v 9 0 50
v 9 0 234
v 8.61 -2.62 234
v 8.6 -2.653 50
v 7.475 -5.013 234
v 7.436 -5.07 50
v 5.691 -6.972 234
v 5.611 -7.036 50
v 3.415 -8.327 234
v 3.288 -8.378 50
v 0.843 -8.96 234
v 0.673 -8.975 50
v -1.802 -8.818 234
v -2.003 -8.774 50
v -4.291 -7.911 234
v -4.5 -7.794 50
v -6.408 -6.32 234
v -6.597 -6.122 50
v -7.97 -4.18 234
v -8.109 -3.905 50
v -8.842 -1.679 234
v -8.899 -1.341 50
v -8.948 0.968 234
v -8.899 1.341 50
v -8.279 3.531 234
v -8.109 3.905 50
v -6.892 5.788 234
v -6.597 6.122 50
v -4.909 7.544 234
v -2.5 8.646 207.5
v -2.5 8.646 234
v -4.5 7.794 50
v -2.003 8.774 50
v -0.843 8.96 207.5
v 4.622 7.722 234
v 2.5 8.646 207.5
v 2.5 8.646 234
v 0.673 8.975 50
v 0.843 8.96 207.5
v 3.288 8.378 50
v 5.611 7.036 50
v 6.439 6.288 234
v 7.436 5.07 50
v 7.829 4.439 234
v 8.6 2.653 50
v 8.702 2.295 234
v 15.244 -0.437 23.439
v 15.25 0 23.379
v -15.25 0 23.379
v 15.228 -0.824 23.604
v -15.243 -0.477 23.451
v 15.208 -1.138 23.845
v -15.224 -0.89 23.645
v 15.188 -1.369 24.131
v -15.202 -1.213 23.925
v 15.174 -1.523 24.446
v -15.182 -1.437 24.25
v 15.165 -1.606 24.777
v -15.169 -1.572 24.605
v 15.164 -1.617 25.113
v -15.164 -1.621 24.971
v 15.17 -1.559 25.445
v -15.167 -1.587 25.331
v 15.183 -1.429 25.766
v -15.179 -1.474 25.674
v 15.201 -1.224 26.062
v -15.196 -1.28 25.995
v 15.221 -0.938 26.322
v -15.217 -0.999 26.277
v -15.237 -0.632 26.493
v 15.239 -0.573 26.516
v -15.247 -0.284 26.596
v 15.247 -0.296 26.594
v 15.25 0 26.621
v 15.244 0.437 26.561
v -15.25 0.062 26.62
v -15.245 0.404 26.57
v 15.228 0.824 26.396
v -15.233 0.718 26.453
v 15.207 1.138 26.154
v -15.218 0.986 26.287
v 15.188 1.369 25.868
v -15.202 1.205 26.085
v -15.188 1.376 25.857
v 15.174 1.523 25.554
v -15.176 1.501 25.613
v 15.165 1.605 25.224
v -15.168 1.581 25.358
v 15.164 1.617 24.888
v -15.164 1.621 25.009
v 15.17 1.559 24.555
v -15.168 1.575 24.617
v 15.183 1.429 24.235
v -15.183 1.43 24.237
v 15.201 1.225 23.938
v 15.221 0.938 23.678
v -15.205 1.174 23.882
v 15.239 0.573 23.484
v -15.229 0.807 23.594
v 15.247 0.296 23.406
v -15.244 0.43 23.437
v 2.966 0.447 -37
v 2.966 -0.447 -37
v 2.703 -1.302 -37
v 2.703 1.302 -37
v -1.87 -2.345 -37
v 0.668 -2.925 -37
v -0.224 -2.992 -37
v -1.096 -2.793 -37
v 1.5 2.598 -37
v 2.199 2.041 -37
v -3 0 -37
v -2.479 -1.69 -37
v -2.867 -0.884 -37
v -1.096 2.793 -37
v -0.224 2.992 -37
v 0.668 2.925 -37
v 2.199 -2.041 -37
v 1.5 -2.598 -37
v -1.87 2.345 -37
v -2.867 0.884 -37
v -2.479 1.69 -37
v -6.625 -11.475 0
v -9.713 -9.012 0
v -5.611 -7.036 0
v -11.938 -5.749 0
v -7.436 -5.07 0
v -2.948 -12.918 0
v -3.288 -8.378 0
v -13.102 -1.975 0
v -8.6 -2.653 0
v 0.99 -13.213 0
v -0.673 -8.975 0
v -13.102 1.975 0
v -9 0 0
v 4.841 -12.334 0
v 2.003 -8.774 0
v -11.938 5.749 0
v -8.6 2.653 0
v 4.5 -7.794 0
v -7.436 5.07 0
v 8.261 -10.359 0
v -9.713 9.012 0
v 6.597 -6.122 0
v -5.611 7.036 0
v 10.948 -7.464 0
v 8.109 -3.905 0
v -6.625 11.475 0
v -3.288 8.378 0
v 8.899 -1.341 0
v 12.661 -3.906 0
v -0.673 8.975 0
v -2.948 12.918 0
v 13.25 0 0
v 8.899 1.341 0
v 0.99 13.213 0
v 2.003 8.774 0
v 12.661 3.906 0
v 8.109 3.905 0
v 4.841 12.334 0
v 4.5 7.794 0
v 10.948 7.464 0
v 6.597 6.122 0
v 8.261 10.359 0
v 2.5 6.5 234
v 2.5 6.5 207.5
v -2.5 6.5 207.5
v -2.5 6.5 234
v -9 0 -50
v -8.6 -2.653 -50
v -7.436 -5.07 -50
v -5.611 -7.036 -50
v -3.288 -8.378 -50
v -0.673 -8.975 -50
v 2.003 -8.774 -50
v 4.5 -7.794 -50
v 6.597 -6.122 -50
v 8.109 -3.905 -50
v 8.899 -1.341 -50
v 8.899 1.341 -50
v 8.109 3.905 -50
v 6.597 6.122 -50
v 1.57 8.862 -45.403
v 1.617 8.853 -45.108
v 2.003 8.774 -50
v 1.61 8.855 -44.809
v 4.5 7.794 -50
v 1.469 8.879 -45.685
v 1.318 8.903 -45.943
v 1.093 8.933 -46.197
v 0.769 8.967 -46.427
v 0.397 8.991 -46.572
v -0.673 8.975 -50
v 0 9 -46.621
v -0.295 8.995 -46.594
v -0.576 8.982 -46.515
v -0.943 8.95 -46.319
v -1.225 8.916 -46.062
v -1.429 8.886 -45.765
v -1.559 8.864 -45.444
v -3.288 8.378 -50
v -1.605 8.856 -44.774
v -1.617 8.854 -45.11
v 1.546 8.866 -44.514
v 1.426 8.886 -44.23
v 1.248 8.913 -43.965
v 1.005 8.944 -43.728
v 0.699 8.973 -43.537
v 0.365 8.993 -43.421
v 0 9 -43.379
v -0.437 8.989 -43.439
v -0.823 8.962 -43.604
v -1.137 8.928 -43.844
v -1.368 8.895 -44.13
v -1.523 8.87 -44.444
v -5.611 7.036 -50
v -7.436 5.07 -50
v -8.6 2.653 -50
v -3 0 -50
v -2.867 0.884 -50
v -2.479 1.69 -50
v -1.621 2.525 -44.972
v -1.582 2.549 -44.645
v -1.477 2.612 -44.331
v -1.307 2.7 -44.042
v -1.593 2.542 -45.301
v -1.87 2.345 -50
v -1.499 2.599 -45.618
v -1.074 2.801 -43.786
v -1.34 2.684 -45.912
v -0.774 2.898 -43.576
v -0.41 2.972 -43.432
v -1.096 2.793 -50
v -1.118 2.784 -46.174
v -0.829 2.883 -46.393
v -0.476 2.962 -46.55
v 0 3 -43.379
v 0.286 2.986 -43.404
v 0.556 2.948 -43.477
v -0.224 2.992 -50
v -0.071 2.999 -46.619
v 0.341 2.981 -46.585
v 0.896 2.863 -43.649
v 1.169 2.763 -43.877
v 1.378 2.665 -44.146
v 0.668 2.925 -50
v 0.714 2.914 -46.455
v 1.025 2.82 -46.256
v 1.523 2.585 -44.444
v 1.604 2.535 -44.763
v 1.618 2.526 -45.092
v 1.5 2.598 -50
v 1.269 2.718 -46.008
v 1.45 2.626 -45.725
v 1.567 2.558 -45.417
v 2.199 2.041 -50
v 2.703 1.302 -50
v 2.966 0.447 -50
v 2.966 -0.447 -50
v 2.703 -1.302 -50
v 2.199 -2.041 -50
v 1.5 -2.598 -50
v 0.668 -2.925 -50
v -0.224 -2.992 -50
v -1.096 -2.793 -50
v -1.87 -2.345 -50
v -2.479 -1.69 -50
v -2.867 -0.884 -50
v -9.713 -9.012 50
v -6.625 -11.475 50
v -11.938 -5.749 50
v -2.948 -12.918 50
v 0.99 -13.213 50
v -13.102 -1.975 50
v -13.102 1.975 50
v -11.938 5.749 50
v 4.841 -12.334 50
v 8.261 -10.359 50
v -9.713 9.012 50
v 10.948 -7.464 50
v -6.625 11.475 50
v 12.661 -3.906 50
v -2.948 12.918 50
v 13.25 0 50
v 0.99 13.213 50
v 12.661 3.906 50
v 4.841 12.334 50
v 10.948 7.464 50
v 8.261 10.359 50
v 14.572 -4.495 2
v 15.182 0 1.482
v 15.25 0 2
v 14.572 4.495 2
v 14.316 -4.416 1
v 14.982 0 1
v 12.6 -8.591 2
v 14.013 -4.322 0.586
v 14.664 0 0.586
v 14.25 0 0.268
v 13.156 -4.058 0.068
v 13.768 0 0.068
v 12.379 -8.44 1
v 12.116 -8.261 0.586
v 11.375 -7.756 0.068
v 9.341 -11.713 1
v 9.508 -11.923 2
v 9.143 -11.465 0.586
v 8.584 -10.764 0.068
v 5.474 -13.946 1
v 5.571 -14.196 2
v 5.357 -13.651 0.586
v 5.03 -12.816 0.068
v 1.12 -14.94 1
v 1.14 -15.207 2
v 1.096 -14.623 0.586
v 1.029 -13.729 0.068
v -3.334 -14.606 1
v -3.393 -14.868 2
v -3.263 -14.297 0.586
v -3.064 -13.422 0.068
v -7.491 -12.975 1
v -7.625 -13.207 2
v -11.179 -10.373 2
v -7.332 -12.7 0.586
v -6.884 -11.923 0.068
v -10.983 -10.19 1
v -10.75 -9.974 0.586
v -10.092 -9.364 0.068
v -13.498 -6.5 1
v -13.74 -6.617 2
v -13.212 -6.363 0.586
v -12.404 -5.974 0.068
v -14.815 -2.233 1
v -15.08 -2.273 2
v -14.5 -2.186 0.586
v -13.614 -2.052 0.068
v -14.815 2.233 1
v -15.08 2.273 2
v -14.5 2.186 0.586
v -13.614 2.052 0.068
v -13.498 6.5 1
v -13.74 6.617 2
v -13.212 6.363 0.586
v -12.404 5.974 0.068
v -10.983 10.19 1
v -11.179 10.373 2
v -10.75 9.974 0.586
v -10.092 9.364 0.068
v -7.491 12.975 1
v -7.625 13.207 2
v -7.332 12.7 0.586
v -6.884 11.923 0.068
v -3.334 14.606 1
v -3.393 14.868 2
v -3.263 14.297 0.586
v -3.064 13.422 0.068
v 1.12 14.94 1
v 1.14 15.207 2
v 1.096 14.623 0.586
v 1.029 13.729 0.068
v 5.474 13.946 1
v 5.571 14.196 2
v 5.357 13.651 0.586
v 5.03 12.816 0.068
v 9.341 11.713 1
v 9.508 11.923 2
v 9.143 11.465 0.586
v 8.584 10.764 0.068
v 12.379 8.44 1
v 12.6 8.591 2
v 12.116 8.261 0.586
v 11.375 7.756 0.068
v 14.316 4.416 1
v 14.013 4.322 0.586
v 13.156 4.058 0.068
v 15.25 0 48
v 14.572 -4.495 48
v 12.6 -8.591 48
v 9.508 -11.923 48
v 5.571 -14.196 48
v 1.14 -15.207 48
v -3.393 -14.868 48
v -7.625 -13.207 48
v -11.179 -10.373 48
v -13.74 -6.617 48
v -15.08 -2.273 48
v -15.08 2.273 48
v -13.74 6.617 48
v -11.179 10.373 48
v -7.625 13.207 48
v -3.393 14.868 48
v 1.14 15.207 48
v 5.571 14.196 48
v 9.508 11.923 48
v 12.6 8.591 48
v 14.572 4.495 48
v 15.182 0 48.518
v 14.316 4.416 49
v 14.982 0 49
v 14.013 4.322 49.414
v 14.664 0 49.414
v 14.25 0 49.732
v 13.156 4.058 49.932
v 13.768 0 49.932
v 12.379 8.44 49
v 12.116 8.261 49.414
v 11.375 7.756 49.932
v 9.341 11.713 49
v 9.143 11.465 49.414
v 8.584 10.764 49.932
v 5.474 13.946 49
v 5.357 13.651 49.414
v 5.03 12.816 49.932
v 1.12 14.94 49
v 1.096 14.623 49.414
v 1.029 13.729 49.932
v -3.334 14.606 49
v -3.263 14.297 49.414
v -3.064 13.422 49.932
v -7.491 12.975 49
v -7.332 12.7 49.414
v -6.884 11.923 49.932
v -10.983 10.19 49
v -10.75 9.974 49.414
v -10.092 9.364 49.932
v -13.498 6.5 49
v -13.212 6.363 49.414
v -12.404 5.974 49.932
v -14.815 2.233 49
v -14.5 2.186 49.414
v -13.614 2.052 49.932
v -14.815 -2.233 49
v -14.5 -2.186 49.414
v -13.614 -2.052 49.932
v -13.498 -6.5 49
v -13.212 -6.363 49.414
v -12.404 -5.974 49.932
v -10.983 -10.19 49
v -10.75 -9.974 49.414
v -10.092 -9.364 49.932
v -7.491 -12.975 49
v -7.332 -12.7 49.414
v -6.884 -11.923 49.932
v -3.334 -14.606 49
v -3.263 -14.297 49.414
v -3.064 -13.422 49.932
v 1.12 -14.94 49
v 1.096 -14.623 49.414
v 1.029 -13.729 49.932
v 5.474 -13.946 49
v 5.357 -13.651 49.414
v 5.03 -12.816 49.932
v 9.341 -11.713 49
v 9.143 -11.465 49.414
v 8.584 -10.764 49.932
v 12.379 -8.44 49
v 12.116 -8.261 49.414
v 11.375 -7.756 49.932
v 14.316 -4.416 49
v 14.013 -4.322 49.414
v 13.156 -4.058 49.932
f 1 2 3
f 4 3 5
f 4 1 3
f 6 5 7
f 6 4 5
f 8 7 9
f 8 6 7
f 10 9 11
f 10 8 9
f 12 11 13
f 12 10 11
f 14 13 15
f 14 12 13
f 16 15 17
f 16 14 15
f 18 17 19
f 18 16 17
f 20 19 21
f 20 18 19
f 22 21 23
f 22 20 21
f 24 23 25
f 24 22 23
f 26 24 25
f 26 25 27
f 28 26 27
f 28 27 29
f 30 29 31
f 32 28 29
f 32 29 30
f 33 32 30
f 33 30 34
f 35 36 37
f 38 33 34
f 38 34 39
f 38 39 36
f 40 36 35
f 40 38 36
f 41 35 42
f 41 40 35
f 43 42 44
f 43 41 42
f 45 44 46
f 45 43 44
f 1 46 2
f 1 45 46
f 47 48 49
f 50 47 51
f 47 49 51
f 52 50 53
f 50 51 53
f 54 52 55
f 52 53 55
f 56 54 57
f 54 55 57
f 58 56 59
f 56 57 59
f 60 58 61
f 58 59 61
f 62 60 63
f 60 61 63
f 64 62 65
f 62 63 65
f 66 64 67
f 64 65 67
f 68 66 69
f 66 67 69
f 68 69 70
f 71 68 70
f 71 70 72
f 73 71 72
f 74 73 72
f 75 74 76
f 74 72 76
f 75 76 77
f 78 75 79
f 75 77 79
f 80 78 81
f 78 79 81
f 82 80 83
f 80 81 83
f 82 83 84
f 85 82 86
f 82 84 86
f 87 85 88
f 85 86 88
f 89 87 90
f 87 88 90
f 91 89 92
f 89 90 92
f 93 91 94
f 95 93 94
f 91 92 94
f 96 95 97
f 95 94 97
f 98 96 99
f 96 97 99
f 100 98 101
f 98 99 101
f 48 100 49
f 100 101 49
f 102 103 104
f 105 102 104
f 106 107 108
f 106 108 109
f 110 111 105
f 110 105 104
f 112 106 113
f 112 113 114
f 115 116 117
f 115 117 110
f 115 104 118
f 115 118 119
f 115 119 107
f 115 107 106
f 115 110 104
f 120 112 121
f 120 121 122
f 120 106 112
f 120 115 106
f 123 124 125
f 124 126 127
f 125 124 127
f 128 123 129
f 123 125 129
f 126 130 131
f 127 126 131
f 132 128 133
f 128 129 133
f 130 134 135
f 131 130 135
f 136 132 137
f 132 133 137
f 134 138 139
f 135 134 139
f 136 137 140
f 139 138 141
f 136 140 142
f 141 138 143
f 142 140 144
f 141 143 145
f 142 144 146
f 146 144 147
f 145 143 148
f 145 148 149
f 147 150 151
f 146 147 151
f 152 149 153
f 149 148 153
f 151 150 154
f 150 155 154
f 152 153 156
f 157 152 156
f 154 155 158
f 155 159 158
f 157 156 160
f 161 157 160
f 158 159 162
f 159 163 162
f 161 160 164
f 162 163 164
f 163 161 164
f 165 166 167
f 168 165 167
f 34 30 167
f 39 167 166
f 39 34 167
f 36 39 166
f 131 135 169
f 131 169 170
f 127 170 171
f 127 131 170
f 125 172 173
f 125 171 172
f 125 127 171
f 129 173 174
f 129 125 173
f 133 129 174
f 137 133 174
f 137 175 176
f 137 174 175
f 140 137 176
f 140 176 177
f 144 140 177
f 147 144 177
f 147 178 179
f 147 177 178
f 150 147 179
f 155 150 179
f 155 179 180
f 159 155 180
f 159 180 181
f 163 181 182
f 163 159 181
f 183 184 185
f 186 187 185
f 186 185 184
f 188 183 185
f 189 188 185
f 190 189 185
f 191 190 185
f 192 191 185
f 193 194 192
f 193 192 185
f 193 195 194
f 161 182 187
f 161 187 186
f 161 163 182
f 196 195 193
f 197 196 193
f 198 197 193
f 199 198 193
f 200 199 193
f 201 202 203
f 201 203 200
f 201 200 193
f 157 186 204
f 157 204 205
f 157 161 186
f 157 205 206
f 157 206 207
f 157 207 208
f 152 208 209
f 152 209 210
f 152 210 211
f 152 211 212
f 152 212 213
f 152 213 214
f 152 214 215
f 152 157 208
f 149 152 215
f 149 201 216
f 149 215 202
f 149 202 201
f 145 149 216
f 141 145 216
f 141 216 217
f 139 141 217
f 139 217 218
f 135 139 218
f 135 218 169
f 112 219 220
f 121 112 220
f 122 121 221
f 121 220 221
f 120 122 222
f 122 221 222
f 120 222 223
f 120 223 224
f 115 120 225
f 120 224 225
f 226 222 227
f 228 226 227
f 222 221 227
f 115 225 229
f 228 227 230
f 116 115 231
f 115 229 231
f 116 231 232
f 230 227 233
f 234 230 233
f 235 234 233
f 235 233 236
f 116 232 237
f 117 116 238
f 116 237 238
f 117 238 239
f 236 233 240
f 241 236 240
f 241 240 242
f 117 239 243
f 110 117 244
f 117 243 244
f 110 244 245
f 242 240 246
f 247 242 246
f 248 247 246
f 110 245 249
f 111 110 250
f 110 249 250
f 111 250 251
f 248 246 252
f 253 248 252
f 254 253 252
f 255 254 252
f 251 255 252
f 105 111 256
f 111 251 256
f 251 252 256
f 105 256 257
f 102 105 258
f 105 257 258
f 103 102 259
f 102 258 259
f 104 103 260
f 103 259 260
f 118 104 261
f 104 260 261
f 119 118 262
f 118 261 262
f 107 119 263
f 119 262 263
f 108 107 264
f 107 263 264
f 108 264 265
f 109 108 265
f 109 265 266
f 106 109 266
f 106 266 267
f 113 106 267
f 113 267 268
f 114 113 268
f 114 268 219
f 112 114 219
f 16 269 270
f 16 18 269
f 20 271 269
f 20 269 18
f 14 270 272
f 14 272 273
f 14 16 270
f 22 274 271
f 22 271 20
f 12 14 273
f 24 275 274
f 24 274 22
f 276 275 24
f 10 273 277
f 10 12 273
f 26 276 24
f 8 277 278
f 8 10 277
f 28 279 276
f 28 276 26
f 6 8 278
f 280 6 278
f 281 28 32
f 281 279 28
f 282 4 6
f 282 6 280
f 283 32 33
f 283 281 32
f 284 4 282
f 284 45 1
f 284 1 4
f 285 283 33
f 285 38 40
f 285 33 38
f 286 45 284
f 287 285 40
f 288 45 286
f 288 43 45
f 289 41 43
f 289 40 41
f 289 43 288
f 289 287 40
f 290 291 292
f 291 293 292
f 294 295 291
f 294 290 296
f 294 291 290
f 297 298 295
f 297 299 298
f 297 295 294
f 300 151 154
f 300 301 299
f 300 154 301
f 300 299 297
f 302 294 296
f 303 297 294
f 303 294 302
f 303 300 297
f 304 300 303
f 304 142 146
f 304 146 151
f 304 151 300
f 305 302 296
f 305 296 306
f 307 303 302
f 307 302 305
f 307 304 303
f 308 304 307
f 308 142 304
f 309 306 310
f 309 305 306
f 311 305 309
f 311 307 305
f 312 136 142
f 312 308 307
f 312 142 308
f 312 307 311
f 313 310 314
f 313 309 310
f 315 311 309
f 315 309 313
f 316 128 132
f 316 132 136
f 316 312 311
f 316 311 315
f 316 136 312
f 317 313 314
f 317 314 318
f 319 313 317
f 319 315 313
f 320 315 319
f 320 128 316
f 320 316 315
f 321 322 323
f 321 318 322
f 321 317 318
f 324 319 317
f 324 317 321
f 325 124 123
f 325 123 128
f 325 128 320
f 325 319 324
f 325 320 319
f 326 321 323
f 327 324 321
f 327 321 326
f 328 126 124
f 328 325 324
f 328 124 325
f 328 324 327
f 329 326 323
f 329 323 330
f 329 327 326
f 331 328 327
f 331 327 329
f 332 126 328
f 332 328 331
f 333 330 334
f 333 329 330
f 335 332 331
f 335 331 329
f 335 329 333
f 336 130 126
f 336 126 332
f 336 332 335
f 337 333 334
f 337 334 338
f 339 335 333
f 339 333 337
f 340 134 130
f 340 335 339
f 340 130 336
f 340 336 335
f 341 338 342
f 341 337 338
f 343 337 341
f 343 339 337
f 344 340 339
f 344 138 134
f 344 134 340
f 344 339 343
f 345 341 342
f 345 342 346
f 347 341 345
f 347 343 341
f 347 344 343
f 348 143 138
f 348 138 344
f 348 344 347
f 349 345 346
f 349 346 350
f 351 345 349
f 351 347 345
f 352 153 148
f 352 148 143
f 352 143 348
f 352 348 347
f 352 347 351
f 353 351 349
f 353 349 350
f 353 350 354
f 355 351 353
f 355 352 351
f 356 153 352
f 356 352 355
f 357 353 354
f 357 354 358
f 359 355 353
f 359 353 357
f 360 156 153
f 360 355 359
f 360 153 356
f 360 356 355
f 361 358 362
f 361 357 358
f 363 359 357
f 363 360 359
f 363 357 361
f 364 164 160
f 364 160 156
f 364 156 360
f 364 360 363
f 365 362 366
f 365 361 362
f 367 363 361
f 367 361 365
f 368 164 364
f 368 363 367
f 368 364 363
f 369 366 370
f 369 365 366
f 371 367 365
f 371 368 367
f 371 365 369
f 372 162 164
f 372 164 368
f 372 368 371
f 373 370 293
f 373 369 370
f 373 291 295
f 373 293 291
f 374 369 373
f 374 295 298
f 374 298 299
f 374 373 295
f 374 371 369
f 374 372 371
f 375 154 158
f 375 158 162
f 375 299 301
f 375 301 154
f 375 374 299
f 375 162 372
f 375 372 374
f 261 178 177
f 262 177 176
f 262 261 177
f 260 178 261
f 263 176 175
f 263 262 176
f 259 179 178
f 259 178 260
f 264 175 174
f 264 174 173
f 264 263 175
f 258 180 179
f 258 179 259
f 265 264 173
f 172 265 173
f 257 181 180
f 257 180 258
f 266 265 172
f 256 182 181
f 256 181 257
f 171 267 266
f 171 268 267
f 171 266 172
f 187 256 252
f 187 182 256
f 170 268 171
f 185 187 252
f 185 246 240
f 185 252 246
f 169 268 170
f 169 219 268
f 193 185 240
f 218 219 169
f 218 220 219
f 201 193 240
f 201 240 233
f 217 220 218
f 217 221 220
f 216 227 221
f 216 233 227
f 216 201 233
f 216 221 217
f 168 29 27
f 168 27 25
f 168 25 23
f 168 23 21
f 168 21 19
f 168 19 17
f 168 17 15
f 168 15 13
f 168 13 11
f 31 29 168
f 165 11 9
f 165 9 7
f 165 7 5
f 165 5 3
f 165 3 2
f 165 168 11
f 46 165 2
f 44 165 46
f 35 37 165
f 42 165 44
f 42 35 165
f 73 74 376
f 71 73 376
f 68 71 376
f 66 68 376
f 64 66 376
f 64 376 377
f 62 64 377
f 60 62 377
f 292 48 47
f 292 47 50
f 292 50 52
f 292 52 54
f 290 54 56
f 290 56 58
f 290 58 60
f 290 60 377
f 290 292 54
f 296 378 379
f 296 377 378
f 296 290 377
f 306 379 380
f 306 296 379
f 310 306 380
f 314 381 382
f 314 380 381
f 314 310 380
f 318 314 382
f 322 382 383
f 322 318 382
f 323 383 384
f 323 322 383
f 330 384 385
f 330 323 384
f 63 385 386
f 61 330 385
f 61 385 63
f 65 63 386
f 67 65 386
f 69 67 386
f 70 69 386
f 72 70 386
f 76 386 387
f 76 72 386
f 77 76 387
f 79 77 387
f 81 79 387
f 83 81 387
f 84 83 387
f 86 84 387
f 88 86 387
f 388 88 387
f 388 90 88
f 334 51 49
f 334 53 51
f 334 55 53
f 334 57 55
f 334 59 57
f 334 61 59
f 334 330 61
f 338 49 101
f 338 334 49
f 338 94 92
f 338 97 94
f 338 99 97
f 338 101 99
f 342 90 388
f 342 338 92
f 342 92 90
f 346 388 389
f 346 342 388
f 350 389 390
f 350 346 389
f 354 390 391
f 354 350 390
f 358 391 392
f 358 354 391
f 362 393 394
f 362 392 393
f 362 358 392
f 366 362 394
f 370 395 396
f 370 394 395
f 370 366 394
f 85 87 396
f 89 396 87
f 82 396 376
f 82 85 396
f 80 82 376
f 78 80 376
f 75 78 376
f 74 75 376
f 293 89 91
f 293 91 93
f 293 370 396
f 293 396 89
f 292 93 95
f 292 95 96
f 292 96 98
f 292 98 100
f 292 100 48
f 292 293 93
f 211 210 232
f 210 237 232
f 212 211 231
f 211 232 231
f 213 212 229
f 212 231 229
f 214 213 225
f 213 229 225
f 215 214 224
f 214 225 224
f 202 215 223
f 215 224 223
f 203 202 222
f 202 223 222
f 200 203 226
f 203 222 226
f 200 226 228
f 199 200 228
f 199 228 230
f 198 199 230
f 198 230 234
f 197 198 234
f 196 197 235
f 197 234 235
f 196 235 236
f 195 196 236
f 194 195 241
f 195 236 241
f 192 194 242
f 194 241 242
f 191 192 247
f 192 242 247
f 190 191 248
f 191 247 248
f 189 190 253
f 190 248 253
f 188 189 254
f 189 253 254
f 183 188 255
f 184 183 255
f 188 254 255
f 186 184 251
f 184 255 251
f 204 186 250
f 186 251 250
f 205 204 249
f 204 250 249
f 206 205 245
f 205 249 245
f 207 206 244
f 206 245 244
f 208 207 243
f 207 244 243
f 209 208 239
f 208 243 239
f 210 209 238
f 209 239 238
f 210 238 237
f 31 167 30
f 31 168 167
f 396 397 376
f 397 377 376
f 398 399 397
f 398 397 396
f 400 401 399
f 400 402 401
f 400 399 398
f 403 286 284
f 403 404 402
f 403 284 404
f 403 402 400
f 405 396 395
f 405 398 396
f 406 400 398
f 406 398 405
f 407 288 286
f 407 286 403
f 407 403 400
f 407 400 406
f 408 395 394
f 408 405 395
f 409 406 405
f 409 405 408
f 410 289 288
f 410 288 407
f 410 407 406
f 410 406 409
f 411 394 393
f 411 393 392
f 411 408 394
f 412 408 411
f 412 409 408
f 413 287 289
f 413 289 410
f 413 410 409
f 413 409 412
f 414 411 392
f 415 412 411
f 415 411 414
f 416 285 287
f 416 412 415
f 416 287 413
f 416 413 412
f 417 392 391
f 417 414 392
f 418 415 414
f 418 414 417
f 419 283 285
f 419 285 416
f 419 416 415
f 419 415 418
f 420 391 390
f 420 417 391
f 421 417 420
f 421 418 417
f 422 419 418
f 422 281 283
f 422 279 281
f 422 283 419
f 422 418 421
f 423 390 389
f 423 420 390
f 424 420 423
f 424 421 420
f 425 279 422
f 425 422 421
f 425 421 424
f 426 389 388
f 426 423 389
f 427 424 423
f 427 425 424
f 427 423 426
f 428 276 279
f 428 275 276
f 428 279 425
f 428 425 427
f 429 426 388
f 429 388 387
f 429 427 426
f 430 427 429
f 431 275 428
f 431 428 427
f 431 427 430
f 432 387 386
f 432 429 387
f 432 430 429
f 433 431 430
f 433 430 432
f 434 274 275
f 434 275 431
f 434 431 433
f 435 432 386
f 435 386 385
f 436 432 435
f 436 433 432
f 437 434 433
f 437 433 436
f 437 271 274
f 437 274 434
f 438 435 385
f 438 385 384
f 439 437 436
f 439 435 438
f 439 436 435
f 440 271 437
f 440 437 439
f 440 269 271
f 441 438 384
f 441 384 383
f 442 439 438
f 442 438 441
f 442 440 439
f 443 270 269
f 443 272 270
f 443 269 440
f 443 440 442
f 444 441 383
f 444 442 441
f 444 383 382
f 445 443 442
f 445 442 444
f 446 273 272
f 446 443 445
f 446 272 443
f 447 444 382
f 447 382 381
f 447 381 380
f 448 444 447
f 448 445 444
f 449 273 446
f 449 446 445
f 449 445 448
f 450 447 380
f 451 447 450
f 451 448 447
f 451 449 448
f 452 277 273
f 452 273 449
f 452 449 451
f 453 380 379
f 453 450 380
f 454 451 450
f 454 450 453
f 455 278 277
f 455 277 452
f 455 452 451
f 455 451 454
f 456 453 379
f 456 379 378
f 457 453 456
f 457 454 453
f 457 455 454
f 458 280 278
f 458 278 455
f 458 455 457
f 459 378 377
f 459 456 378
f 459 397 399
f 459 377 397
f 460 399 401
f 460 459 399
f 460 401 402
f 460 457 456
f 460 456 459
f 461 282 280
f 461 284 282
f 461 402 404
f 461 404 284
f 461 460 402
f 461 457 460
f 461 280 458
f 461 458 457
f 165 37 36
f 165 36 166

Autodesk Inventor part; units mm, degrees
ref_plane "YZ Plane" through (0, 0, 0) normal (1, 0, 0) x (0, 1, 0)
sketch "Sketch1" plane through (0, 0, 0) normal (0, 0, 1) x (1, 0, 0)
  circle A0 centre (0, 0) radius 15.25
  dimension "d0" = 30.5
extrude "Extrusion1" add sketch "Sketch1" along normal blind 50
fillet "Fillet1" radius 2 1 edges at (-15.25, 0, 50)
fillet "Fillet2" radius 2 1 edges at (-15.25, 0, 0)
sketch "Sketch2" plane through (0, 0, 50) normal (0, 0, 1) x (1, 0, 0)
  circle A0 centre (0, 0) radius 9
  dimension "d5" = 18
extrude "Extrusion2" add sketch "Sketch2" along normal blind 184
sketch "Sketch3" plane through (0, 0, 0) normal (0, 0, -1) x (-1, 0, 0)
  circle A0 centre (0, 0) radius 9
extrude "Extrusion3" add sketch "Sketch3" along normal blind 50
sketch "Sketch4" plane through (0, 0, -50) normal (0, 0, -1) x (-1, 0, 0)
  circle A0 centre (0, 0) radius 3
  dimension "d10" = 6
extrude "Extrusion4" cut sketch "Sketch4" against normal blind 13
sketch "Sketch5" plane through (0, 0, -50) normal (0, 0, -1) x (-1, 0, 0)
  circle A0 centre (0, 0) radius 9 projected
  point P0 (0, 9)
ref_plane "Work Plane1" through (0, 9, -50) normal (0, 1, 0) x (-1, 0, 0)
sketch "Sketch6" plane through (0, 9, -50) normal (0, 1, 0) x (-1, 0, 0)
  line L0 (-9, 0) -> (9, 0) projected
  point P0 (0, 50)
  point P1 (0, 5)
  dimension "d13" = 5
hole "Hole1" at (0, 9, -45) direction (0, -1, 0) diameter 3.242 depth 9 tip angle 118 thread size "M4x0.7" class "6H" standard "ISO Metric profile"
sketch "Sketch7" plane through (0, 0, 0) normal (0, 0, -1) x (-1, 0, 0)
  circle A0 centre (0, 0) radius 15.25 projected
  point P0 (-15.25, 0)
ref_plane "Work Plane2" through (15.25, 0, 0) normal (1, 0, 0) x (0, 1, 0)
sketch "Sketch8" plane through (15.25, 0, 0) normal (1, 0, 0) x (0, 1, 0)
  point P0 (0, 0)
  point P1 (0, 25)
  dimension "d21" = 25
hole "Hole2" at (15.25, 0, 25) direction (-1, 0, 0) diameter 3.242 end through all thread size "M4x0.7" class "6H" standard "ISO Metric profile"
sketch "Sketch9" plane through (0, 0, 234) normal (0, 0, 1) x (1, 0, 0)
  circle A0 centre (0, 0) radius 9 projected
  line L0 (2.5, 8.9) -> (2.5, 6.5)
  line L1 (2.5, 6.5) -> (-2.5, 6.5)
  line L2 (-2.5, 6.5) -> (-2.5, 8.6458)
  line L3 (-2.5, 6.5) -> (-2.5, 9)
  line L4 (-2.5, 9) -> (2.5, 9)
  line L5 (2.5, 9) -> (2.5, 6.8873)
  line L6 (-2.5, 9) -> (-2.5, 6.5)
  line L7 (-2.5, 6.5) -> (2.5, 6.5)
  point P0 (0, 6.5)
  point P1 (2.5, 7.7)
  point P2 (2.5, 8.6458)
  dimension "d29" = 5
  dimension "d31" = 0
  dimension "d32" = 2.5
  dimension "d33" = 6.5
  dimension "d34" = 2.5
extrude "Extrusion5" cut sketch "Sketch9" against normal blind 26.5 contours A0 L0 L1 L2 picked at (0, 7.3333)
equation "\"d27\" = Thickness"
equation "\"BendRadius\" = Thickness"
equation "\"BendReliefWidth\" = Thickness"
equation "\"BendReliefDepth\" = 0.5 * Thickness"
equation "\"CornerReliefSize\" = 4 * Thickness"
equation "\"MinimumRemnant\" = 2 * Thickness"
equation "\"TransitionRadius\" = BendRadius"
equation "\"JacobiRadiusSize\" = BendRadius"
equation "\"GapSize\" = Thickness"
equation "\"Thickness\" = 0.5"
properties part number "Final joint shaft"
